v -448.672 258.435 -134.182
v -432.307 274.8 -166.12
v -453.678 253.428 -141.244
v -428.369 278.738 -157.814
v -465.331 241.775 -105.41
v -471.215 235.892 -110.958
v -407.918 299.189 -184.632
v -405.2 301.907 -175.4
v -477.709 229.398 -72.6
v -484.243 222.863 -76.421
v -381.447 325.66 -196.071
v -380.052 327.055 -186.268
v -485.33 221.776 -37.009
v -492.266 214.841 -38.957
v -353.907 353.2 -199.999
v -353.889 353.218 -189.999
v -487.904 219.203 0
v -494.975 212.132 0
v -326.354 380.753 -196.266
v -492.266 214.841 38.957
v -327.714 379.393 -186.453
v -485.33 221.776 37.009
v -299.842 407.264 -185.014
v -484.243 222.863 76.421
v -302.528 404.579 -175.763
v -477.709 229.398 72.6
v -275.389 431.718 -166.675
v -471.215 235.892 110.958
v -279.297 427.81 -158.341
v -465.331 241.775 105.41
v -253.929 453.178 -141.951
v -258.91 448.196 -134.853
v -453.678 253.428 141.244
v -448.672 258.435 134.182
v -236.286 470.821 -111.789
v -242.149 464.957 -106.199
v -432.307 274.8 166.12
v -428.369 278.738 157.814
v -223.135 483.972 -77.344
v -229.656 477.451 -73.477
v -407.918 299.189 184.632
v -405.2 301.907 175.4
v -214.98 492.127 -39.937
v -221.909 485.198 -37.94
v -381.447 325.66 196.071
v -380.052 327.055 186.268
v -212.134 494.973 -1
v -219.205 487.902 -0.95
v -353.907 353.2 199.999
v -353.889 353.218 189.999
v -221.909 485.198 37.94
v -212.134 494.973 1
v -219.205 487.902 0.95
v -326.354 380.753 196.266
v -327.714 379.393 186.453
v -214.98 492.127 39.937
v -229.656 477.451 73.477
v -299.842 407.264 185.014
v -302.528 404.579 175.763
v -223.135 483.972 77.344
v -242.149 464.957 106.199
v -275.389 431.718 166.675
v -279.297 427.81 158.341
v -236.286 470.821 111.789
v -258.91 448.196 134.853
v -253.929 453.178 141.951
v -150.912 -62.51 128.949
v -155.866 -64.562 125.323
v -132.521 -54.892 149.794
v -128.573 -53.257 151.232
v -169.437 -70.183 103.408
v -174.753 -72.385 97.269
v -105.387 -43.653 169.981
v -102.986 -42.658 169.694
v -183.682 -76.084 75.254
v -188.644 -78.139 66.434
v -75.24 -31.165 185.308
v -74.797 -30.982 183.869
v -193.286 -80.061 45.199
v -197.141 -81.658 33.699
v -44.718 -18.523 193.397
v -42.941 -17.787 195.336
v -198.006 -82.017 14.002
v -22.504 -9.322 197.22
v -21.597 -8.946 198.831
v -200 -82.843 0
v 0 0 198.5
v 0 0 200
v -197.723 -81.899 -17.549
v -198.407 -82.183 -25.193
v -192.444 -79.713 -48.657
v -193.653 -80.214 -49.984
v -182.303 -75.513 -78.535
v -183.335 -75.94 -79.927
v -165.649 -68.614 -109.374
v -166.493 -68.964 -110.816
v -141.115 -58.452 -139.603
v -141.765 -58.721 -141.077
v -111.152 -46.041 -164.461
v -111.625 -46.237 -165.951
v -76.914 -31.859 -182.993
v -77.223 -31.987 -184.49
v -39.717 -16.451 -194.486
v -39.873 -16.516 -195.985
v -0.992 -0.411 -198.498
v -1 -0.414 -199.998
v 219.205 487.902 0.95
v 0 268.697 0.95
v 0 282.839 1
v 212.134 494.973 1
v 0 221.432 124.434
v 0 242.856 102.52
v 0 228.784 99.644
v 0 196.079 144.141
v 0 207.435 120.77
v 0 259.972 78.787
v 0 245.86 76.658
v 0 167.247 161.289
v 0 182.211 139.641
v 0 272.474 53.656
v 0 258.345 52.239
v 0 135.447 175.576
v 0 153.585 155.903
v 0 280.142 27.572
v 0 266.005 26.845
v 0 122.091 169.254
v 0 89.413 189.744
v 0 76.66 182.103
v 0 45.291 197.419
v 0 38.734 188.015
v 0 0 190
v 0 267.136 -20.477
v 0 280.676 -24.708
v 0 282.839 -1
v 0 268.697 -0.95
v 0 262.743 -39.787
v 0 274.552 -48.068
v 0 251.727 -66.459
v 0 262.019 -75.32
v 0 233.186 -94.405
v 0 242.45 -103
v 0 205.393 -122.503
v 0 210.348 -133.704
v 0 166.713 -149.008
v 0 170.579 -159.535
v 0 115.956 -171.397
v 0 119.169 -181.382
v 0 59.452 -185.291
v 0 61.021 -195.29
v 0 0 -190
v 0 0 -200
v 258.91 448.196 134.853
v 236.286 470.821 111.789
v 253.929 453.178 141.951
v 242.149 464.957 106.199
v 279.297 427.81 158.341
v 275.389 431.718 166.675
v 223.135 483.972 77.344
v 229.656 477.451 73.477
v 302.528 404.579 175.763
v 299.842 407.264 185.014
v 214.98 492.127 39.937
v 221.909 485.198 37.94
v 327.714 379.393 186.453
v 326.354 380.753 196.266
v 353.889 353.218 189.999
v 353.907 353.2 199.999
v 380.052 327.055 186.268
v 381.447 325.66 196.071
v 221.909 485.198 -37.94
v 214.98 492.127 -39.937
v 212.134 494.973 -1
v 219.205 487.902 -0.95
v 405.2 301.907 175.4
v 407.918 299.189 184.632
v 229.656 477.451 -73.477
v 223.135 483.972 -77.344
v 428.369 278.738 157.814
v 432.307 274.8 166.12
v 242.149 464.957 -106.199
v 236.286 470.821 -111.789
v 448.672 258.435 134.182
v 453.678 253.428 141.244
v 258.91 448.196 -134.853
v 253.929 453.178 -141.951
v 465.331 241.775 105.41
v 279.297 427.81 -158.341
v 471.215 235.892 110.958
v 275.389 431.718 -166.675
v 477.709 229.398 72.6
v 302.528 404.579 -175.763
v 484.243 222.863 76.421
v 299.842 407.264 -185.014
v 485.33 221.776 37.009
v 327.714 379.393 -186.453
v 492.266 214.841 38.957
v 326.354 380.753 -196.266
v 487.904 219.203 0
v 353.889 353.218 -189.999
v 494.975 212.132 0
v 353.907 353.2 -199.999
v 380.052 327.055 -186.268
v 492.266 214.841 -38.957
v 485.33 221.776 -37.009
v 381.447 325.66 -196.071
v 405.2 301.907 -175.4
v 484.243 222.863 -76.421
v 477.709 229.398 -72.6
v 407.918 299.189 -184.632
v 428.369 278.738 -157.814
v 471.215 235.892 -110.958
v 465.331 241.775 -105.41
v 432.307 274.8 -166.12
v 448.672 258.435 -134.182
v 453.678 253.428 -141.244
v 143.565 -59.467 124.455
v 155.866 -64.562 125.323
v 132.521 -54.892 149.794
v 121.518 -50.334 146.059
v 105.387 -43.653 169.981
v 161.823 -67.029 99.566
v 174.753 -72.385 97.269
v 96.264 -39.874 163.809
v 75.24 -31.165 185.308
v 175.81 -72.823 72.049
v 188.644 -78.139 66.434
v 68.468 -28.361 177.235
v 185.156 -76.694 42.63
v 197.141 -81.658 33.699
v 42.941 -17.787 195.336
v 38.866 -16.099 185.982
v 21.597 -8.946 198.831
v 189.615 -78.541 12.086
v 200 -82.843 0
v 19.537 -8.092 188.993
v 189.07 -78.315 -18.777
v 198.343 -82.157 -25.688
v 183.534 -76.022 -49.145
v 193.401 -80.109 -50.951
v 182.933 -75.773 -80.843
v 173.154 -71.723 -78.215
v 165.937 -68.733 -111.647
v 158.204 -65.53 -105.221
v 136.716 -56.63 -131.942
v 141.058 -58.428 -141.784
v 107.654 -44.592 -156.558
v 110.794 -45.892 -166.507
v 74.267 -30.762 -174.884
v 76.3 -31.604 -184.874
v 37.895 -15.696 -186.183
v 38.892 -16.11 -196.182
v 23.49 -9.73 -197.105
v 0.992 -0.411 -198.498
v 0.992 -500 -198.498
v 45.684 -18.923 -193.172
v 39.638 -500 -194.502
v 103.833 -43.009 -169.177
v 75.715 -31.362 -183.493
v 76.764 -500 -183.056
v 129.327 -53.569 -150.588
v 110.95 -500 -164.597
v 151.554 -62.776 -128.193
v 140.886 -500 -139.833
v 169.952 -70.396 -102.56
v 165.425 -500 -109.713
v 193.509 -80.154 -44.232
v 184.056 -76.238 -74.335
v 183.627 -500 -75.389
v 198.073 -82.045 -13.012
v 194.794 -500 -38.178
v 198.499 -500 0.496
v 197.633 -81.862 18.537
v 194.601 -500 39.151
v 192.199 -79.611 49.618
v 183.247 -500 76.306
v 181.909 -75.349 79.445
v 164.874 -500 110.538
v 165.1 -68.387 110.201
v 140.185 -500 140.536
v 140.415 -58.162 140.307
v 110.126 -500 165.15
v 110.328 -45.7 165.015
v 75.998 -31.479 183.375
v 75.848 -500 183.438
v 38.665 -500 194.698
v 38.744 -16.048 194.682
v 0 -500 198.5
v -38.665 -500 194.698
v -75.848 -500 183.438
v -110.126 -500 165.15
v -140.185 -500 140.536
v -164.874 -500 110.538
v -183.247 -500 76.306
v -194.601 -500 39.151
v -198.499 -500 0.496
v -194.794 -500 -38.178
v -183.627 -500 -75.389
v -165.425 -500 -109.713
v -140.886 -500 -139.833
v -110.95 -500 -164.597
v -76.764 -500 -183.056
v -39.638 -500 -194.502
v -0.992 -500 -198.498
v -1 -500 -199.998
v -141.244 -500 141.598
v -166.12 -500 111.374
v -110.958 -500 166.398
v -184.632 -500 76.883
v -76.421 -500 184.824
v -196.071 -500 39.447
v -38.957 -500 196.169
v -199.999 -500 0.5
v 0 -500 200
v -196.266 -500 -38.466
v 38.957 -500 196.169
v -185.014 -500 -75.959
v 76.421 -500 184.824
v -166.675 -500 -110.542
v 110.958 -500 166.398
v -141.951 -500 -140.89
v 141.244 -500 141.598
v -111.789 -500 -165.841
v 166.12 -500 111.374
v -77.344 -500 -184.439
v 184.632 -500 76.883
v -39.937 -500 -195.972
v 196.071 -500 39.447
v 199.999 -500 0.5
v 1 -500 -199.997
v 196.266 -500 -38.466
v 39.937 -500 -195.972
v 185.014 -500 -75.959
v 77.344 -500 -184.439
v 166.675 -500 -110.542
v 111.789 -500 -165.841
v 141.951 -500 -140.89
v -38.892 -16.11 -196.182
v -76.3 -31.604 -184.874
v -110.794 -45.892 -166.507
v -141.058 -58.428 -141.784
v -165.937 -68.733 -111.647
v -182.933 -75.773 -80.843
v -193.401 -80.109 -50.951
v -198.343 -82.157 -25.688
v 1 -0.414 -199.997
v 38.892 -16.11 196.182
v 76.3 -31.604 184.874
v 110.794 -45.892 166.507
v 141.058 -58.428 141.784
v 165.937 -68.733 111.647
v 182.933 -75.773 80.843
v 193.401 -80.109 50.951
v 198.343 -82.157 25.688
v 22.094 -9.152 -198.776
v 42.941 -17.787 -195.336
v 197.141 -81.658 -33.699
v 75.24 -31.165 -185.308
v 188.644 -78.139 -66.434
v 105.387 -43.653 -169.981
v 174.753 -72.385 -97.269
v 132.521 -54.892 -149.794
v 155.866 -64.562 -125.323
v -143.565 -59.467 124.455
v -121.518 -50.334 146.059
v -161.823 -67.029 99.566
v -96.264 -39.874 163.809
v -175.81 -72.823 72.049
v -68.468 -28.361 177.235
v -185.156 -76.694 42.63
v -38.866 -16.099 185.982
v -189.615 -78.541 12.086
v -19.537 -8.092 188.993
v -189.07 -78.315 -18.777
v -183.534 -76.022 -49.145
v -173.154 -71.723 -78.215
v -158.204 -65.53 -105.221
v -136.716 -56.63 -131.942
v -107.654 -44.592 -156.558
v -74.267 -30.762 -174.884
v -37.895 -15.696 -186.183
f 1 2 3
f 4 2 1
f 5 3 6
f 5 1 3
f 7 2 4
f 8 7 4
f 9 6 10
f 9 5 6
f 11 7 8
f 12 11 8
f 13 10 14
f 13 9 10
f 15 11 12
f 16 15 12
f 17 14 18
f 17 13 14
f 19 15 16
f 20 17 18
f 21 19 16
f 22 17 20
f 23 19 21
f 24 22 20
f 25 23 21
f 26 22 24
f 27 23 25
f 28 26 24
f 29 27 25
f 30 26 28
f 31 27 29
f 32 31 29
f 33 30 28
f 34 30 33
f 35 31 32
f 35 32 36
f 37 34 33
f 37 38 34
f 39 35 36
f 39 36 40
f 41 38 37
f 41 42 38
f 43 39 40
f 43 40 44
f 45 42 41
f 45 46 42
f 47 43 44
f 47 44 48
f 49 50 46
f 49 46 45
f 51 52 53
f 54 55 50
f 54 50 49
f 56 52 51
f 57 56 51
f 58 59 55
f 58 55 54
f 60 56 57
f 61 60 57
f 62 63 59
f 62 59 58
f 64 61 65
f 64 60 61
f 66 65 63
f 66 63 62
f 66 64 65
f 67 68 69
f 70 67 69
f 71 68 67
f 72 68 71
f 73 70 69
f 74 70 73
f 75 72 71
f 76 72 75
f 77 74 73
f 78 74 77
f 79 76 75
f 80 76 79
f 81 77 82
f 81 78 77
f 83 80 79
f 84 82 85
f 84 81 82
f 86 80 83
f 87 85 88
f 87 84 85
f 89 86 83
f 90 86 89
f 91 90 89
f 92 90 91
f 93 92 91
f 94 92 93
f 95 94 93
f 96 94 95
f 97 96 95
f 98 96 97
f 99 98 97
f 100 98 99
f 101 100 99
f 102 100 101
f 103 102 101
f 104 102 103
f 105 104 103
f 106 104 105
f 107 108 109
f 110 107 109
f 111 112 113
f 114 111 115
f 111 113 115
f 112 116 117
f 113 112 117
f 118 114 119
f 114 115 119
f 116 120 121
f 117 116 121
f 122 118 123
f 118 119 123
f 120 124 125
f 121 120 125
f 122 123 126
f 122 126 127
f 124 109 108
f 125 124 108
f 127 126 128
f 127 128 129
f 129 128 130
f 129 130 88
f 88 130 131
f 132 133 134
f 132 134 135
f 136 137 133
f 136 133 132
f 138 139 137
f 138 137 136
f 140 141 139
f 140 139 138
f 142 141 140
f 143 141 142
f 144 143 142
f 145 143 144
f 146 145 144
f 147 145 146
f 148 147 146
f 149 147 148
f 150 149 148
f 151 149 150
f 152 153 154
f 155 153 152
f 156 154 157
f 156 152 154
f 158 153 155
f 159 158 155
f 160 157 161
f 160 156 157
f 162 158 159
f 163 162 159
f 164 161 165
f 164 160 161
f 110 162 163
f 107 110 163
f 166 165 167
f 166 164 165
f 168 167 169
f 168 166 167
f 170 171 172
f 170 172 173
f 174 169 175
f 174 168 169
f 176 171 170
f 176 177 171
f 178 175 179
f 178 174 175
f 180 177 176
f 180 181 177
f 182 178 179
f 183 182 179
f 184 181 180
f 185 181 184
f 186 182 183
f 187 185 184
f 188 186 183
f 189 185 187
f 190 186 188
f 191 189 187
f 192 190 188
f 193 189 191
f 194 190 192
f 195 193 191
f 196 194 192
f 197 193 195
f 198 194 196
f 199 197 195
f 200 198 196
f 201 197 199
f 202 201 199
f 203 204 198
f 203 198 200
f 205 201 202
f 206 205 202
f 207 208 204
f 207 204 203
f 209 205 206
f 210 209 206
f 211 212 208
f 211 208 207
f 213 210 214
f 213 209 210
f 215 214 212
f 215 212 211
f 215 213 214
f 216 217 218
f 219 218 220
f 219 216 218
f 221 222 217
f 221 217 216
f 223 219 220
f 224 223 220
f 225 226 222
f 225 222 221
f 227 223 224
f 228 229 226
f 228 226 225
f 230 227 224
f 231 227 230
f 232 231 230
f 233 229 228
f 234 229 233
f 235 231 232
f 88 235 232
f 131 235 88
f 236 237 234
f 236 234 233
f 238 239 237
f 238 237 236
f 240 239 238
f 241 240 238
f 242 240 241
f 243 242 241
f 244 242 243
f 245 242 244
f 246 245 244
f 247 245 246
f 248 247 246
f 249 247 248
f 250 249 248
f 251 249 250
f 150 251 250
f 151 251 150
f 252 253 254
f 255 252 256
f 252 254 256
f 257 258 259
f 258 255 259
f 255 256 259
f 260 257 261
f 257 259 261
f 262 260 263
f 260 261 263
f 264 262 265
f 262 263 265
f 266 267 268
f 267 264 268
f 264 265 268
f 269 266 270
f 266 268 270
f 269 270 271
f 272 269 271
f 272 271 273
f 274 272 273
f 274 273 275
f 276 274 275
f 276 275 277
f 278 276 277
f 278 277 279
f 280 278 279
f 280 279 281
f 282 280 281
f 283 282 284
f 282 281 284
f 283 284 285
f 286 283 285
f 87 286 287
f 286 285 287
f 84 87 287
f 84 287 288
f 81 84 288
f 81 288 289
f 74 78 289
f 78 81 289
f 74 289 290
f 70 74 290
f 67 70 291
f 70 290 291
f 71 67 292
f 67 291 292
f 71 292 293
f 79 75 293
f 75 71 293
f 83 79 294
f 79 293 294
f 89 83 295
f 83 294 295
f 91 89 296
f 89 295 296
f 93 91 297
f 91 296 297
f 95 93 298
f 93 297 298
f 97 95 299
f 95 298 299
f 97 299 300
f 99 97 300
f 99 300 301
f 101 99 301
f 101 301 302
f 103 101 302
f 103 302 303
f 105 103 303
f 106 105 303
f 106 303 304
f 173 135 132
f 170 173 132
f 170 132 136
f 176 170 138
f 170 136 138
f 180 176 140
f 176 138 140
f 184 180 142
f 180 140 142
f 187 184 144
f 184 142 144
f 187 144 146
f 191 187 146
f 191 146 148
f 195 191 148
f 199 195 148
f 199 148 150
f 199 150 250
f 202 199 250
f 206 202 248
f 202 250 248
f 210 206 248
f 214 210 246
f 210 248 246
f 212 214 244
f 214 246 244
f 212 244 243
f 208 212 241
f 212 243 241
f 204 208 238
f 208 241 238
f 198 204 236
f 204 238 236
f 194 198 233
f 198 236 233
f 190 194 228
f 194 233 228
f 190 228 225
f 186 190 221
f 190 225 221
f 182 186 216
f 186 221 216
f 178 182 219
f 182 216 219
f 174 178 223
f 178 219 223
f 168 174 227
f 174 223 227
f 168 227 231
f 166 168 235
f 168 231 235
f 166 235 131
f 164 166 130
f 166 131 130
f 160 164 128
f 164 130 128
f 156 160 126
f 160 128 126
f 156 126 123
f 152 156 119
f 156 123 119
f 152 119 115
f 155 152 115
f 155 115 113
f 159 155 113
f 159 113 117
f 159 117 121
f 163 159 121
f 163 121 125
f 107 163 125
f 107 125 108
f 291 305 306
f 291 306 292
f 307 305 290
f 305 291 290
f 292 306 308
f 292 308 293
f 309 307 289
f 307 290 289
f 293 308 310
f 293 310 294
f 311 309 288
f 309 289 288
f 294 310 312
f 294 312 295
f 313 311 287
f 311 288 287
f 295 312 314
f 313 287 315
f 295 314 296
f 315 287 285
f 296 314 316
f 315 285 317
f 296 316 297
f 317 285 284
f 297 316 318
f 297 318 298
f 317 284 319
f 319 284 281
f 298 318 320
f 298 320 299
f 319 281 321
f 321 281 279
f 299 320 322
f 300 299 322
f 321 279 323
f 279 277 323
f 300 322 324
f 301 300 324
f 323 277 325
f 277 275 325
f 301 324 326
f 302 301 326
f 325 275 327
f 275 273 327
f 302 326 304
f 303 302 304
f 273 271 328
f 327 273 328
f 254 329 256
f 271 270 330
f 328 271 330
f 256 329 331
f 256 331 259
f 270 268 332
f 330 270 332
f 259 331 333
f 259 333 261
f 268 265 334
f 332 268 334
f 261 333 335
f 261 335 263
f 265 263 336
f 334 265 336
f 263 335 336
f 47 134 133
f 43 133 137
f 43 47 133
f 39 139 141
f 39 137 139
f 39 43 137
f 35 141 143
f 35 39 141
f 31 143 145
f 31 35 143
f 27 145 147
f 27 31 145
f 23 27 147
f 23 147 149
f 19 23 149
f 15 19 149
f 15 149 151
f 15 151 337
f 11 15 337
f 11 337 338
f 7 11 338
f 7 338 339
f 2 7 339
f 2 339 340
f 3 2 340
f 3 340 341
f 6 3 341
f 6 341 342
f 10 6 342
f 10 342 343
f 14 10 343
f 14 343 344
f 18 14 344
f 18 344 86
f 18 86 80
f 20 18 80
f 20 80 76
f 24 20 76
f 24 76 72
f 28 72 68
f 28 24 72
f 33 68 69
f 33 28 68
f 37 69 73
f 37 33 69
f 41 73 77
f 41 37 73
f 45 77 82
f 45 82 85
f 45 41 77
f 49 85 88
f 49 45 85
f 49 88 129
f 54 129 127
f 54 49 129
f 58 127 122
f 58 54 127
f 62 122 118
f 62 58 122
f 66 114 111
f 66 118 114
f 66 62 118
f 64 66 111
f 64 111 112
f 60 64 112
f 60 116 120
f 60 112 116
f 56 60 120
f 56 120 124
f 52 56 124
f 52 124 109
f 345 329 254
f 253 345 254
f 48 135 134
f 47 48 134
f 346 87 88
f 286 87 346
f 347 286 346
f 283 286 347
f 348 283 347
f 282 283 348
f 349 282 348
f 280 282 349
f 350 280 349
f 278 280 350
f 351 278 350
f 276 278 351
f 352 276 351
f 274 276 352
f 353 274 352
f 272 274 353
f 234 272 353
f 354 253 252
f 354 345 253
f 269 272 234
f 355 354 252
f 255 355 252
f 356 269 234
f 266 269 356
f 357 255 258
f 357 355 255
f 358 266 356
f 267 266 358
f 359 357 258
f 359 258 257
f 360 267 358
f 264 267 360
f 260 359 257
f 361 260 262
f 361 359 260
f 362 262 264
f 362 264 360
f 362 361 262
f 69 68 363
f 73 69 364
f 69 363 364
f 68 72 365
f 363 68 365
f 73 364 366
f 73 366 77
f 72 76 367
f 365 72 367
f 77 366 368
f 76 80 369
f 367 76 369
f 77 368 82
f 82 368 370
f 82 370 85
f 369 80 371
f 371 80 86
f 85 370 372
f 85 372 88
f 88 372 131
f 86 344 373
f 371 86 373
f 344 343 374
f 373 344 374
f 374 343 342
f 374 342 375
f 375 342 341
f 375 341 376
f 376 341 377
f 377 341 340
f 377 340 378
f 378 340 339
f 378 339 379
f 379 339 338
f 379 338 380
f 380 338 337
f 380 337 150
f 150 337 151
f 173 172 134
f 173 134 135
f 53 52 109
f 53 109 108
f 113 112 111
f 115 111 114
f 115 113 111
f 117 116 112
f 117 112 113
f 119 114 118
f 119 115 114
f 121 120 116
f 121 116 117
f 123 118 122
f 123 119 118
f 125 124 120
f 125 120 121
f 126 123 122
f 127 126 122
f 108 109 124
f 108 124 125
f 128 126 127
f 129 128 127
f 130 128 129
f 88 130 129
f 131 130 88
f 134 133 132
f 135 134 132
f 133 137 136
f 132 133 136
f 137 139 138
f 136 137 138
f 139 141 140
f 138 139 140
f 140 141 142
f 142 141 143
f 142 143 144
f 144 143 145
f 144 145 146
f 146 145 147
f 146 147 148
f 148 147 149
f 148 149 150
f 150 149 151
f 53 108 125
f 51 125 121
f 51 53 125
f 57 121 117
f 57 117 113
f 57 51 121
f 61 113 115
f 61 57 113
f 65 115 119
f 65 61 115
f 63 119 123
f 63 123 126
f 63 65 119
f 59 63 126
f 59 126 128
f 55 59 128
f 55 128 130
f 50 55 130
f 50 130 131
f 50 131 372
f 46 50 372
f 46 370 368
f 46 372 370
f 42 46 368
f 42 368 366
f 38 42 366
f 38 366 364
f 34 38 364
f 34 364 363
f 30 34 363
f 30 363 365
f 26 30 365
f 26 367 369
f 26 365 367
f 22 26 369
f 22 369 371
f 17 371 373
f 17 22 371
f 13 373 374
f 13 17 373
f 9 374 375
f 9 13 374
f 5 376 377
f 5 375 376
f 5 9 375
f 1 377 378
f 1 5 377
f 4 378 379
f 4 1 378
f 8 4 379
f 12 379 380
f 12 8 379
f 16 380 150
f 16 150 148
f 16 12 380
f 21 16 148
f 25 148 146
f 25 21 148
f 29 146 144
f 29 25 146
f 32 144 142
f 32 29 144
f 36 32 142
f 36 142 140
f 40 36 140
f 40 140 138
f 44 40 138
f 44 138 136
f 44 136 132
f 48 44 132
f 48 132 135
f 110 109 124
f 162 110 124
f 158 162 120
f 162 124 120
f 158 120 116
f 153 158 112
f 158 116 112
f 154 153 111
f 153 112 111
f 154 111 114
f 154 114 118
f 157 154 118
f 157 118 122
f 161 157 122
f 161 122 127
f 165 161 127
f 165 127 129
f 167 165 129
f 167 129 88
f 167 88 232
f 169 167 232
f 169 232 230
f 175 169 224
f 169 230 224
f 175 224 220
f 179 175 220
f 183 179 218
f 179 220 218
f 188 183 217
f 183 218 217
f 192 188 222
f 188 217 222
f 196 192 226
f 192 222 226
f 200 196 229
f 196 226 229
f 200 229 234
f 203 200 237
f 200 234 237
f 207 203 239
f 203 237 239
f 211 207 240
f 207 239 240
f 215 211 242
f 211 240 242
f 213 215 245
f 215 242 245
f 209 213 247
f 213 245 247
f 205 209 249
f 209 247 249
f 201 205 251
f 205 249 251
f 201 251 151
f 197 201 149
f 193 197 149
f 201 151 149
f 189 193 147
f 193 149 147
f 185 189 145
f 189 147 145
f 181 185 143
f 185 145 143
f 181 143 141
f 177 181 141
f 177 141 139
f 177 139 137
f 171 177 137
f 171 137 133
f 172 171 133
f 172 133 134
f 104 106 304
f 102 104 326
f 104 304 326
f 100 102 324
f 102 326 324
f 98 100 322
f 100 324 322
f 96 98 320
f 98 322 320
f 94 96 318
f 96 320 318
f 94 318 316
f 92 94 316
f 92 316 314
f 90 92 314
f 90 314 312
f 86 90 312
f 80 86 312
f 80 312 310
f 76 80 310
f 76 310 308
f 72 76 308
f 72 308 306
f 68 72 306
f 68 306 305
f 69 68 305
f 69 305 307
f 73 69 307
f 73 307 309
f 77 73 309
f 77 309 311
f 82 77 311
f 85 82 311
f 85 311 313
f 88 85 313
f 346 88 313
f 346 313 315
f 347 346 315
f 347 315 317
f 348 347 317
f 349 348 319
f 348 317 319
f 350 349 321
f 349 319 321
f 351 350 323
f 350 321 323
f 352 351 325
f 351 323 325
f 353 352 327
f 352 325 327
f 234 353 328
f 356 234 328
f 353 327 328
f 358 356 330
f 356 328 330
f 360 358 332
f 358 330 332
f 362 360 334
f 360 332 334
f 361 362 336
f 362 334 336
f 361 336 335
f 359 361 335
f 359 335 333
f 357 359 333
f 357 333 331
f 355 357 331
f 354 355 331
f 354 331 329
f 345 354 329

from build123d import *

# Parameters (mm, degrees)
BASE_FLANGE1_START      = -500
BASE_FLANGE1_DEPTH      = 500
CUT_EXTRUDE1_DEPTH      = 729.009787024
CUT_EXTRUDE1_DEPTH_BACK = 729.009787024
BASE_FLANGE2_DEPTH      = 500
CUT_EXTRUDE6_DEPTH      = 729.009787024
CUT_EXTRUDE6_DEPTH_BACK = 729.009787024
BASE_FLANGE3_DEPTH      = 500
CUT_EXTRUDE7_DEPTH      = 732.436941916
CUT_EXTRUDE7_DEPTH_BACK = 732.436941916


# Read off the part's stored shape, not the designer's step: Base-Flange1
# Sheet-metal steps are written as plain solids
with BuildPart() as part:
    # Base-Flange1 outline → Base-Flange1 (new body)
    with BuildSketch(Plane(origin=(353.553390593, 353.553390593, 0), x_dir=(0.7071067811865486, -0.7071067811865465, 0), z_dir=(0.7071067811865465, 0.7071067811865486, 0)).offset(BASE_FLANGE1_START)):
        with BuildLine():
            Line((-189.997625, -0.949997031), (-199.9975, -0.999996875))
            ThreePointArc((-199.9975, -0.999996875), (200, 0), (-199.9975, 0.999996875))
            Line((-199.9975, 0.999996875), (-189.997625, 0.949997031))
            ThreePointArc((-189.997625, 0.949997031), (190, 0), (-189.997625, -0.949997031))
        make_face()
    extrude(amount=BASE_FLANGE1_DEPTH)

    # Sketch7 → Cut-Extrude1 (cut, two sides: drawn at the far end of the back side and taken through both)
    with BuildSketch(Plane.XY.offset(-CUT_EXTRUDE1_DEPTH_BACK)):
        Polygon((141.421356237, -141.421356237), (200, -82.842712475), (0, 0), align=None)
        Polygon((0, 282.839176941), (0, 0), (-141.41958847, 141.41958847), align=None)
    extrude(amount=CUT_EXTRUDE1_DEPTH + CUT_EXTRUDE1_DEPTH_BACK, mode=Mode.SUBTRACT)


with BuildPart() as body_2:
    # Sketch8 → Base-Flange2 (new body)
    with BuildSketch(Plane(origin=(-353.553390593, 353.553390593, 0), x_dir=(0, 0, 1), z_dir=(-0.7071067811865489, 0.7071067811865462, 0))):
        with BuildLine():
            ThreePointArc((-0.999996875, 199.9975), (0, -200), (0.999996875, 199.9975))
            Line((0.999996875, 199.9975), (0.949997031, 189.997625))
            ThreePointArc((0.949997031, 189.997625), (0, -190), (-0.949997031, 189.997625))
            Line((-0.949997031, 189.997625), (-0.999996875, 199.9975))
        make_face()
    extrude(amount=-BASE_FLANGE2_DEPTH)

    # Sketch11 → Cut-Extrude6 (cut, two sides: drawn at the far end of the back side and taken through both)
    with BuildSketch(Plane.XY.offset(-CUT_EXTRUDE6_DEPTH_BACK)):
        Polygon((-141.421356237, -141.421356237), (-200, -82.842712475), (0, 0), align=None)
        Polygon((141.41958847, 141.41958847), (0, 282.839176941), (0, 0), align=None)
    extrude(amount=CUT_EXTRUDE6_DEPTH + CUT_EXTRUDE6_DEPTH_BACK, mode=Mode.SUBTRACT)


with BuildPart() as body_3:
    # Sketch12 → Base-Flange3 (new body)
    with BuildSketch(Plane(origin=(0, -500, 0), x_dir=(1, 0, 0), z_dir=(0, 1, 0))):
        with BuildLine():
            ThreePointArc((-0.999996875, 199.9975), (0, -200), (0.999996875, 199.9975))
            Line((0.999996875, 199.9975), (0.992496898, 198.49751875))
            ThreePointArc((0.992496898, 198.49751875), (0, -198.5), (-0.992496898, 198.49751875))
            Line((-0.992496898, 198.49751875), (-0.999996875, 199.9975))
        make_face()
    extrude(amount=BASE_FLANGE3_DEPTH)

    # Sketch15 → Cut-Extrude7 (cut, two sides: drawn at the far end of the back side and taken through both)
    with BuildSketch(Plane.XY.offset(-CUT_EXTRUDE7_DEPTH_BACK)):
        Polygon((-200, -82.842712475), (0, 0), (-200, 0), align=None)
        Polygon((200, -82.842712475), (200, 0), (0, 0), align=None)
    extrude(amount=CUT_EXTRUDE7_DEPTH + CUT_EXTRUDE7_DEPTH_BACK, mode=Mode.SUBTRACT)


solid = Compound([part.part, body_2.part, body_3.part])
